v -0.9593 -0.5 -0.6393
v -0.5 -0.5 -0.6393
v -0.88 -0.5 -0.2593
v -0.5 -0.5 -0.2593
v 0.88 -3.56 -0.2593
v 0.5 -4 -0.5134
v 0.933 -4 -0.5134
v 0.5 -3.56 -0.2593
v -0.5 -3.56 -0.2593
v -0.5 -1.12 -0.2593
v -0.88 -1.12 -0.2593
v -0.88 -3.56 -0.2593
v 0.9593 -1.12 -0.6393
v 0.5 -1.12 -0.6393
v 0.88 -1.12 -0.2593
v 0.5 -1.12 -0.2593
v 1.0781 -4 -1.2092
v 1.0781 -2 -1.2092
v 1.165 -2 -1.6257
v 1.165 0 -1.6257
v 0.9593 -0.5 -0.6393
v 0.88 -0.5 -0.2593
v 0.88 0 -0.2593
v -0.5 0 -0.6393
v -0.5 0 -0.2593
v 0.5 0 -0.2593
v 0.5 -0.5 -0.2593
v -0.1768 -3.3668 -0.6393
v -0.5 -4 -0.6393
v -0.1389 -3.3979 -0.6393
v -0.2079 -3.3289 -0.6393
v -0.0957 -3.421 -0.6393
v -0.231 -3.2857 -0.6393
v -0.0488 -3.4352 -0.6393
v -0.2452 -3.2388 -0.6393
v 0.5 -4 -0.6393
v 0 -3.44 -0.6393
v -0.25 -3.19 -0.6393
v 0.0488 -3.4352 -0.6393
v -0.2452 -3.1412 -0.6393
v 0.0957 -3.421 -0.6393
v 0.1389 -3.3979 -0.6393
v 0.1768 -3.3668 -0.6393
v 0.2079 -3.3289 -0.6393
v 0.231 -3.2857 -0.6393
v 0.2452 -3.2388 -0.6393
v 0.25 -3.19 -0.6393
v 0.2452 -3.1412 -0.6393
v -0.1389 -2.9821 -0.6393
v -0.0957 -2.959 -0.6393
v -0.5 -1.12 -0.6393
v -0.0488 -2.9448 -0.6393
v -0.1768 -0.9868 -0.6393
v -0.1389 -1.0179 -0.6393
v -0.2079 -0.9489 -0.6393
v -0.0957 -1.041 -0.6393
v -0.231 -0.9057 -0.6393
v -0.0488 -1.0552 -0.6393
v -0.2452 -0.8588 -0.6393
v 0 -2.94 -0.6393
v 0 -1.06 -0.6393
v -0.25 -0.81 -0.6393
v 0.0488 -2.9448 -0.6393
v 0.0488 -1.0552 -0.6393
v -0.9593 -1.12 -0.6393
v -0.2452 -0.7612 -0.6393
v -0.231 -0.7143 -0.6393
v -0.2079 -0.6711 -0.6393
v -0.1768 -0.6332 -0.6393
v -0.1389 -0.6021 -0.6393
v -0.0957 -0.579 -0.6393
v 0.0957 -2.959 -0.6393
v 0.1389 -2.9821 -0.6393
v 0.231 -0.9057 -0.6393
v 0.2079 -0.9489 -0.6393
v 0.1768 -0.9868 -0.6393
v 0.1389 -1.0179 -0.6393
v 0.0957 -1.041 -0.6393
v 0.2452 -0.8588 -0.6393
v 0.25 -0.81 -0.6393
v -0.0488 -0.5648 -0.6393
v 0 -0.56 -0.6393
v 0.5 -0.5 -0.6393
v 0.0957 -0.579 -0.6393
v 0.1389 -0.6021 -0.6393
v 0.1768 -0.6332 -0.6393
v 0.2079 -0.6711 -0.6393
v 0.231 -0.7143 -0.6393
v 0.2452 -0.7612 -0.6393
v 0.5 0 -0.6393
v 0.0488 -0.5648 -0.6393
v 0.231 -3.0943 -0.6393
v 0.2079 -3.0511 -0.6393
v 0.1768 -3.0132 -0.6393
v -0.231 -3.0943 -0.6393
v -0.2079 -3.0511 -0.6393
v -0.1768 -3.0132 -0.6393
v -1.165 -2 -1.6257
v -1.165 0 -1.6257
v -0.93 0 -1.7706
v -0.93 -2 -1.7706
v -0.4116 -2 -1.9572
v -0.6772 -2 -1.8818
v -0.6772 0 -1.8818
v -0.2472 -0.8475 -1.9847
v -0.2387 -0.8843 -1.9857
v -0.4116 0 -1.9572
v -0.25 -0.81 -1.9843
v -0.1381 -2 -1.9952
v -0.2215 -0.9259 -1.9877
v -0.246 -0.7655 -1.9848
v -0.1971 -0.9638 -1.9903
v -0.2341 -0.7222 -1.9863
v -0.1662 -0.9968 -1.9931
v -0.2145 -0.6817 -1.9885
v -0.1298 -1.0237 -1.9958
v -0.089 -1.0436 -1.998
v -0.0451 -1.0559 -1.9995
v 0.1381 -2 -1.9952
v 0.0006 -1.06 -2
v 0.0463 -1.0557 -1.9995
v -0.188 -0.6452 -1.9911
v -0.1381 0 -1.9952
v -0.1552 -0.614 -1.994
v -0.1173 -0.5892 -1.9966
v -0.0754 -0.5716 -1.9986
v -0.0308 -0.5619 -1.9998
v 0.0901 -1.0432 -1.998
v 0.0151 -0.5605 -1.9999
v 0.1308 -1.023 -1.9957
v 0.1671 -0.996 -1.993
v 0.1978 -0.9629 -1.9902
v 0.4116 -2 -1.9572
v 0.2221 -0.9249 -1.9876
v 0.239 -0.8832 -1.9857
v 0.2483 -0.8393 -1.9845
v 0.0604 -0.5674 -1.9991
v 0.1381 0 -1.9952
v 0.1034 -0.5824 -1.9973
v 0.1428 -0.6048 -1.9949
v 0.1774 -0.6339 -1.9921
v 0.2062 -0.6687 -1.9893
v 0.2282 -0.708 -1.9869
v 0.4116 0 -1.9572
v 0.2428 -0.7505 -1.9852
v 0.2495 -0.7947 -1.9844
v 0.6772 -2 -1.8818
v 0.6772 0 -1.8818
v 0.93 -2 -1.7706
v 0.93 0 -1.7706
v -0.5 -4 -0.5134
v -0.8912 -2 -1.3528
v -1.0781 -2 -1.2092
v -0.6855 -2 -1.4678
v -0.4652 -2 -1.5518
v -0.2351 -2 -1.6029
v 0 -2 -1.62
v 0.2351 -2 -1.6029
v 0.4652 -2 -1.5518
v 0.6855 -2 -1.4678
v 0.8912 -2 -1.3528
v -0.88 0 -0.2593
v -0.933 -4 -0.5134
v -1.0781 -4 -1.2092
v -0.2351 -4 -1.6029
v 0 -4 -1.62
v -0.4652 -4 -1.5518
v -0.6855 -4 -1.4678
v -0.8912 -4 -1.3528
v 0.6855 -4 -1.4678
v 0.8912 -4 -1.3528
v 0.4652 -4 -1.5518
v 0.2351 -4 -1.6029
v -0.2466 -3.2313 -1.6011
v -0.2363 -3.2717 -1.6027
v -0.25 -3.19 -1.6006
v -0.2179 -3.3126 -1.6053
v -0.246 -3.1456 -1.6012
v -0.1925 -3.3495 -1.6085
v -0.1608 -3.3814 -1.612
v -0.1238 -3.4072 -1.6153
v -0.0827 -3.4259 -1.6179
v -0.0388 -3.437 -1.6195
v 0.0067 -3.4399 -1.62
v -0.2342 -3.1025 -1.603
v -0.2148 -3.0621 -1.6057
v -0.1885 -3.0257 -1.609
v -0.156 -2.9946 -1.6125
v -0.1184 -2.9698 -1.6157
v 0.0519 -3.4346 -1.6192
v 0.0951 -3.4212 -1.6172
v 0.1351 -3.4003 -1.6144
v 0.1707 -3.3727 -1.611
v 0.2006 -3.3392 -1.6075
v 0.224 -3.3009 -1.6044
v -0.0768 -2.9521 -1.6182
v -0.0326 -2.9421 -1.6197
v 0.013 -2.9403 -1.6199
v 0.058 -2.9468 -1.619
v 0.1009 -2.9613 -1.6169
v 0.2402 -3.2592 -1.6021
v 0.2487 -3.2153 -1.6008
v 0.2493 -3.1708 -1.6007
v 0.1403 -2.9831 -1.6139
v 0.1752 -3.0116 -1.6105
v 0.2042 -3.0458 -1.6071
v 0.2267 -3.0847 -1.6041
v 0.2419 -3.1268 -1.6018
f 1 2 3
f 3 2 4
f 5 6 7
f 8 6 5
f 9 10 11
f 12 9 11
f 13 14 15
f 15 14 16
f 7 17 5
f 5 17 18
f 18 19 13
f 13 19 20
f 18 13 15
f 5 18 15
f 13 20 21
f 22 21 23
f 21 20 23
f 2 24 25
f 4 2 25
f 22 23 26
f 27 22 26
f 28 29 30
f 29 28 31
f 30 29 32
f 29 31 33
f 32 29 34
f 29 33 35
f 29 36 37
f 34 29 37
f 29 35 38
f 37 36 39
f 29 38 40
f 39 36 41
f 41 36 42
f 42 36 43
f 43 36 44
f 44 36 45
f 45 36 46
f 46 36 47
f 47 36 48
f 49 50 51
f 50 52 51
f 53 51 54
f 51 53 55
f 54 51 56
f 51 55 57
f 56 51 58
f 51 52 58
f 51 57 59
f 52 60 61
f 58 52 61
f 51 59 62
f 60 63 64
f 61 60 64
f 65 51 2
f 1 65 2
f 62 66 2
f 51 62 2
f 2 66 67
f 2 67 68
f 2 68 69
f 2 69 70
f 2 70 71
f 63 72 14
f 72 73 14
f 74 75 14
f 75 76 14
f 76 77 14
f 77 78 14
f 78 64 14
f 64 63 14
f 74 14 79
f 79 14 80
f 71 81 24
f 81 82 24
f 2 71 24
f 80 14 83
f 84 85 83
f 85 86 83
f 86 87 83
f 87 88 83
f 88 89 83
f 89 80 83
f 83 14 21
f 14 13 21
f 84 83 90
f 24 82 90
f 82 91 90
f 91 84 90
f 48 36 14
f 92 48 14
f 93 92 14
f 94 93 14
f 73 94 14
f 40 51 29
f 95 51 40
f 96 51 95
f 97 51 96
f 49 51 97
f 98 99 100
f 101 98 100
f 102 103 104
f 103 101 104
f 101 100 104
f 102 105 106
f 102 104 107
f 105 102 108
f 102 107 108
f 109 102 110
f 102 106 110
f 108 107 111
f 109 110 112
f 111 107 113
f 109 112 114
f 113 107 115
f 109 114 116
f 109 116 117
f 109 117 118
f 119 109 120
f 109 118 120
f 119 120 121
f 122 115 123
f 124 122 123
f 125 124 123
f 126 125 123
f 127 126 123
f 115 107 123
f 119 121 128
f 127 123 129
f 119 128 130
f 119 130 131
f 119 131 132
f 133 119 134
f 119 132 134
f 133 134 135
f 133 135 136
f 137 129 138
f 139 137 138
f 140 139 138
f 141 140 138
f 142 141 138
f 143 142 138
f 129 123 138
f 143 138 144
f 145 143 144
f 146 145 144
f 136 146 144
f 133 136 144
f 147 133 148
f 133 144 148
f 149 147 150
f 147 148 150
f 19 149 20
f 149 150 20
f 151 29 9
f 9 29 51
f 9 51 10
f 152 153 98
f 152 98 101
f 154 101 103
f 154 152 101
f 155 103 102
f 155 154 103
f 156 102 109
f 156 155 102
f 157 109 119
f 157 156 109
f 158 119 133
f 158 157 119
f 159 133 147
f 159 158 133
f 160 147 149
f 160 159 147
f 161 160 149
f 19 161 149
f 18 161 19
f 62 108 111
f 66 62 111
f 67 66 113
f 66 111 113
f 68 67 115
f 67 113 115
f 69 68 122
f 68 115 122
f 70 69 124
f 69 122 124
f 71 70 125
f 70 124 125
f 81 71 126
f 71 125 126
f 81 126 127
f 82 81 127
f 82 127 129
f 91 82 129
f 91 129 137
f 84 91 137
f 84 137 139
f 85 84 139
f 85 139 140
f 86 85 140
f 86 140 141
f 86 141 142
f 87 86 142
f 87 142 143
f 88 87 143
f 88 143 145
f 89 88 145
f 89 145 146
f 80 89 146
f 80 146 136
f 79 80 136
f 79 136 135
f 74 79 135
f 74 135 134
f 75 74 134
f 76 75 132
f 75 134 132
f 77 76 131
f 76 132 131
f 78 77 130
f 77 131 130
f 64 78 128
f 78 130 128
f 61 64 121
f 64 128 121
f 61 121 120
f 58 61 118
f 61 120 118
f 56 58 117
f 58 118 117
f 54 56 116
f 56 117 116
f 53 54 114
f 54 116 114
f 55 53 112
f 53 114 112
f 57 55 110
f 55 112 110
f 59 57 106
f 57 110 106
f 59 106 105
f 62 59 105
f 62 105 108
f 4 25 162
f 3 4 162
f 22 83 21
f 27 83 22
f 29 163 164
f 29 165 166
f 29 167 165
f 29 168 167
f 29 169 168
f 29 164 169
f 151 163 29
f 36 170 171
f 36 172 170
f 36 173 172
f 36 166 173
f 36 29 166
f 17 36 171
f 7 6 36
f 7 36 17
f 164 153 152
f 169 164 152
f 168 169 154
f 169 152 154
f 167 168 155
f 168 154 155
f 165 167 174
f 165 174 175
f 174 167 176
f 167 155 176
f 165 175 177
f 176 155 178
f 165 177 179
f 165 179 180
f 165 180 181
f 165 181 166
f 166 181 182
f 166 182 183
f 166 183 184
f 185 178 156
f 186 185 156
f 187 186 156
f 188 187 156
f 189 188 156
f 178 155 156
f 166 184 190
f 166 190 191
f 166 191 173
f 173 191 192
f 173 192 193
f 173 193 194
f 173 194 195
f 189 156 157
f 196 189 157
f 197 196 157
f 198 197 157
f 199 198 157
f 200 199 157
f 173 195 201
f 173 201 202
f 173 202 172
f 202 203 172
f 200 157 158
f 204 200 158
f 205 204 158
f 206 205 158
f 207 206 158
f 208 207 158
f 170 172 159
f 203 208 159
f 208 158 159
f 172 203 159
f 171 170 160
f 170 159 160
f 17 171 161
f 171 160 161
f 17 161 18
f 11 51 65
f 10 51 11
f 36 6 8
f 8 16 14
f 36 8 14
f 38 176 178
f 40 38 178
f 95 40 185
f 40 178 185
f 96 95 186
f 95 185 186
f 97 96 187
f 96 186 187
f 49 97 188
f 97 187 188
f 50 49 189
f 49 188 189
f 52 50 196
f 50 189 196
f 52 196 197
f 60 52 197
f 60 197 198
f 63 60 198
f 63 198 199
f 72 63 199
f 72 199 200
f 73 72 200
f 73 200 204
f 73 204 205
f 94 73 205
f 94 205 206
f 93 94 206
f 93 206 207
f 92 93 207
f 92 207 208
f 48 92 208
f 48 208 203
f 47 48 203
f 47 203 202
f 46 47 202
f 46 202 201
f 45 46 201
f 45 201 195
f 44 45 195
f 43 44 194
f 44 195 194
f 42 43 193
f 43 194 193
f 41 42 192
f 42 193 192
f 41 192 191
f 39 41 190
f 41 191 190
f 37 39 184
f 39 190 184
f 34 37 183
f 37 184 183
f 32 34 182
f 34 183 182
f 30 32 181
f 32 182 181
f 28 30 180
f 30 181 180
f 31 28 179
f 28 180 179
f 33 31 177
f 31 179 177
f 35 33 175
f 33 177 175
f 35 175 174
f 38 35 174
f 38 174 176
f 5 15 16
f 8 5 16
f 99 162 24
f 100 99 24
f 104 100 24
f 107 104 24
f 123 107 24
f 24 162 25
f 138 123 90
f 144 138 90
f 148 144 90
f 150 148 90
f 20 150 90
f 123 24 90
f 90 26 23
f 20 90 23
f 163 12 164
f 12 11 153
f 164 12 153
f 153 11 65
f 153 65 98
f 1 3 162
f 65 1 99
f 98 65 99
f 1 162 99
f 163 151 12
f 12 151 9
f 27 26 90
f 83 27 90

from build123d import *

# Parameters (mm, degrees)
F1_DEPTH      = 4
F2_W          = 0.62
F2_H          = 0.6393354729
F3_DEPTH      = 1.166
F3_DEPTH_BACK = 1.166
F5_R          = 2.5
F5_R_2        = 1.62
F6_DEPTH      = 2.001
F8_D          = 0.5


with BuildPart() as f1:
    # F0 (on Front) → F1 (new body)
    with BuildSketch(Plane.XZ):
        with BuildLine():
            Line((-0.88, -0.2593354729), (-1.165, -1.6256614039))
            ThreePointArc((-1.165, -1.6256614039), (0, -2), (1.165, -1.6256614039))
            Line((1.165, -1.6256614039), (0.88, -0.2593354729))
            Line((0.88, -0.2593354729), (0.5, -0.2593354729))
            Line((0.5, -0.2593354729), (0.5, -0.6393354729))
            Line((0.5, -0.6393354729), (-0.5, -0.6393354729))
            Line((-0.5, -0.6393354729), (-0.5, -0.2593354729))
            Line((-0.5, -0.2593354729), (-0.88, -0.2593354729))
        make_face()
    extrude(amount=F1_DEPTH)

    # F2 (on Right) → F3 (cut, two sides)
    with BuildSketch(Plane.YZ) as f3_sk:
        with Locations((-0.81, -0.3196677365)):
            Rectangle(F2_W, F2_H)
        Polygon((-4, -0.5133695914), (-3.1108177847, 0), (-4, 0), align=None)
    extrude(amount=-F3_DEPTH, mode=Mode.SUBTRACT)
    extrude(f3_sk.sketch, amount=F3_DEPTH_BACK, mode=Mode.SUBTRACT)

    # F5 (on offset) → F6 (cut, through all)
    with BuildSketch(Plane.XZ.offset(2)):
        Circle(F5_R)
        Circle(F5_R_2, mode=Mode.SUBTRACT)
    extrude(amount=F6_DEPTH, mode=Mode.SUBTRACT)

    # F8 (through all)
    with Locations(Plane.XY.offset(-0.6393354729)):
        with Locations((0, -0.81), (0, -3.19)):
            Hole(F8_D / 2)


solid = f1.part
